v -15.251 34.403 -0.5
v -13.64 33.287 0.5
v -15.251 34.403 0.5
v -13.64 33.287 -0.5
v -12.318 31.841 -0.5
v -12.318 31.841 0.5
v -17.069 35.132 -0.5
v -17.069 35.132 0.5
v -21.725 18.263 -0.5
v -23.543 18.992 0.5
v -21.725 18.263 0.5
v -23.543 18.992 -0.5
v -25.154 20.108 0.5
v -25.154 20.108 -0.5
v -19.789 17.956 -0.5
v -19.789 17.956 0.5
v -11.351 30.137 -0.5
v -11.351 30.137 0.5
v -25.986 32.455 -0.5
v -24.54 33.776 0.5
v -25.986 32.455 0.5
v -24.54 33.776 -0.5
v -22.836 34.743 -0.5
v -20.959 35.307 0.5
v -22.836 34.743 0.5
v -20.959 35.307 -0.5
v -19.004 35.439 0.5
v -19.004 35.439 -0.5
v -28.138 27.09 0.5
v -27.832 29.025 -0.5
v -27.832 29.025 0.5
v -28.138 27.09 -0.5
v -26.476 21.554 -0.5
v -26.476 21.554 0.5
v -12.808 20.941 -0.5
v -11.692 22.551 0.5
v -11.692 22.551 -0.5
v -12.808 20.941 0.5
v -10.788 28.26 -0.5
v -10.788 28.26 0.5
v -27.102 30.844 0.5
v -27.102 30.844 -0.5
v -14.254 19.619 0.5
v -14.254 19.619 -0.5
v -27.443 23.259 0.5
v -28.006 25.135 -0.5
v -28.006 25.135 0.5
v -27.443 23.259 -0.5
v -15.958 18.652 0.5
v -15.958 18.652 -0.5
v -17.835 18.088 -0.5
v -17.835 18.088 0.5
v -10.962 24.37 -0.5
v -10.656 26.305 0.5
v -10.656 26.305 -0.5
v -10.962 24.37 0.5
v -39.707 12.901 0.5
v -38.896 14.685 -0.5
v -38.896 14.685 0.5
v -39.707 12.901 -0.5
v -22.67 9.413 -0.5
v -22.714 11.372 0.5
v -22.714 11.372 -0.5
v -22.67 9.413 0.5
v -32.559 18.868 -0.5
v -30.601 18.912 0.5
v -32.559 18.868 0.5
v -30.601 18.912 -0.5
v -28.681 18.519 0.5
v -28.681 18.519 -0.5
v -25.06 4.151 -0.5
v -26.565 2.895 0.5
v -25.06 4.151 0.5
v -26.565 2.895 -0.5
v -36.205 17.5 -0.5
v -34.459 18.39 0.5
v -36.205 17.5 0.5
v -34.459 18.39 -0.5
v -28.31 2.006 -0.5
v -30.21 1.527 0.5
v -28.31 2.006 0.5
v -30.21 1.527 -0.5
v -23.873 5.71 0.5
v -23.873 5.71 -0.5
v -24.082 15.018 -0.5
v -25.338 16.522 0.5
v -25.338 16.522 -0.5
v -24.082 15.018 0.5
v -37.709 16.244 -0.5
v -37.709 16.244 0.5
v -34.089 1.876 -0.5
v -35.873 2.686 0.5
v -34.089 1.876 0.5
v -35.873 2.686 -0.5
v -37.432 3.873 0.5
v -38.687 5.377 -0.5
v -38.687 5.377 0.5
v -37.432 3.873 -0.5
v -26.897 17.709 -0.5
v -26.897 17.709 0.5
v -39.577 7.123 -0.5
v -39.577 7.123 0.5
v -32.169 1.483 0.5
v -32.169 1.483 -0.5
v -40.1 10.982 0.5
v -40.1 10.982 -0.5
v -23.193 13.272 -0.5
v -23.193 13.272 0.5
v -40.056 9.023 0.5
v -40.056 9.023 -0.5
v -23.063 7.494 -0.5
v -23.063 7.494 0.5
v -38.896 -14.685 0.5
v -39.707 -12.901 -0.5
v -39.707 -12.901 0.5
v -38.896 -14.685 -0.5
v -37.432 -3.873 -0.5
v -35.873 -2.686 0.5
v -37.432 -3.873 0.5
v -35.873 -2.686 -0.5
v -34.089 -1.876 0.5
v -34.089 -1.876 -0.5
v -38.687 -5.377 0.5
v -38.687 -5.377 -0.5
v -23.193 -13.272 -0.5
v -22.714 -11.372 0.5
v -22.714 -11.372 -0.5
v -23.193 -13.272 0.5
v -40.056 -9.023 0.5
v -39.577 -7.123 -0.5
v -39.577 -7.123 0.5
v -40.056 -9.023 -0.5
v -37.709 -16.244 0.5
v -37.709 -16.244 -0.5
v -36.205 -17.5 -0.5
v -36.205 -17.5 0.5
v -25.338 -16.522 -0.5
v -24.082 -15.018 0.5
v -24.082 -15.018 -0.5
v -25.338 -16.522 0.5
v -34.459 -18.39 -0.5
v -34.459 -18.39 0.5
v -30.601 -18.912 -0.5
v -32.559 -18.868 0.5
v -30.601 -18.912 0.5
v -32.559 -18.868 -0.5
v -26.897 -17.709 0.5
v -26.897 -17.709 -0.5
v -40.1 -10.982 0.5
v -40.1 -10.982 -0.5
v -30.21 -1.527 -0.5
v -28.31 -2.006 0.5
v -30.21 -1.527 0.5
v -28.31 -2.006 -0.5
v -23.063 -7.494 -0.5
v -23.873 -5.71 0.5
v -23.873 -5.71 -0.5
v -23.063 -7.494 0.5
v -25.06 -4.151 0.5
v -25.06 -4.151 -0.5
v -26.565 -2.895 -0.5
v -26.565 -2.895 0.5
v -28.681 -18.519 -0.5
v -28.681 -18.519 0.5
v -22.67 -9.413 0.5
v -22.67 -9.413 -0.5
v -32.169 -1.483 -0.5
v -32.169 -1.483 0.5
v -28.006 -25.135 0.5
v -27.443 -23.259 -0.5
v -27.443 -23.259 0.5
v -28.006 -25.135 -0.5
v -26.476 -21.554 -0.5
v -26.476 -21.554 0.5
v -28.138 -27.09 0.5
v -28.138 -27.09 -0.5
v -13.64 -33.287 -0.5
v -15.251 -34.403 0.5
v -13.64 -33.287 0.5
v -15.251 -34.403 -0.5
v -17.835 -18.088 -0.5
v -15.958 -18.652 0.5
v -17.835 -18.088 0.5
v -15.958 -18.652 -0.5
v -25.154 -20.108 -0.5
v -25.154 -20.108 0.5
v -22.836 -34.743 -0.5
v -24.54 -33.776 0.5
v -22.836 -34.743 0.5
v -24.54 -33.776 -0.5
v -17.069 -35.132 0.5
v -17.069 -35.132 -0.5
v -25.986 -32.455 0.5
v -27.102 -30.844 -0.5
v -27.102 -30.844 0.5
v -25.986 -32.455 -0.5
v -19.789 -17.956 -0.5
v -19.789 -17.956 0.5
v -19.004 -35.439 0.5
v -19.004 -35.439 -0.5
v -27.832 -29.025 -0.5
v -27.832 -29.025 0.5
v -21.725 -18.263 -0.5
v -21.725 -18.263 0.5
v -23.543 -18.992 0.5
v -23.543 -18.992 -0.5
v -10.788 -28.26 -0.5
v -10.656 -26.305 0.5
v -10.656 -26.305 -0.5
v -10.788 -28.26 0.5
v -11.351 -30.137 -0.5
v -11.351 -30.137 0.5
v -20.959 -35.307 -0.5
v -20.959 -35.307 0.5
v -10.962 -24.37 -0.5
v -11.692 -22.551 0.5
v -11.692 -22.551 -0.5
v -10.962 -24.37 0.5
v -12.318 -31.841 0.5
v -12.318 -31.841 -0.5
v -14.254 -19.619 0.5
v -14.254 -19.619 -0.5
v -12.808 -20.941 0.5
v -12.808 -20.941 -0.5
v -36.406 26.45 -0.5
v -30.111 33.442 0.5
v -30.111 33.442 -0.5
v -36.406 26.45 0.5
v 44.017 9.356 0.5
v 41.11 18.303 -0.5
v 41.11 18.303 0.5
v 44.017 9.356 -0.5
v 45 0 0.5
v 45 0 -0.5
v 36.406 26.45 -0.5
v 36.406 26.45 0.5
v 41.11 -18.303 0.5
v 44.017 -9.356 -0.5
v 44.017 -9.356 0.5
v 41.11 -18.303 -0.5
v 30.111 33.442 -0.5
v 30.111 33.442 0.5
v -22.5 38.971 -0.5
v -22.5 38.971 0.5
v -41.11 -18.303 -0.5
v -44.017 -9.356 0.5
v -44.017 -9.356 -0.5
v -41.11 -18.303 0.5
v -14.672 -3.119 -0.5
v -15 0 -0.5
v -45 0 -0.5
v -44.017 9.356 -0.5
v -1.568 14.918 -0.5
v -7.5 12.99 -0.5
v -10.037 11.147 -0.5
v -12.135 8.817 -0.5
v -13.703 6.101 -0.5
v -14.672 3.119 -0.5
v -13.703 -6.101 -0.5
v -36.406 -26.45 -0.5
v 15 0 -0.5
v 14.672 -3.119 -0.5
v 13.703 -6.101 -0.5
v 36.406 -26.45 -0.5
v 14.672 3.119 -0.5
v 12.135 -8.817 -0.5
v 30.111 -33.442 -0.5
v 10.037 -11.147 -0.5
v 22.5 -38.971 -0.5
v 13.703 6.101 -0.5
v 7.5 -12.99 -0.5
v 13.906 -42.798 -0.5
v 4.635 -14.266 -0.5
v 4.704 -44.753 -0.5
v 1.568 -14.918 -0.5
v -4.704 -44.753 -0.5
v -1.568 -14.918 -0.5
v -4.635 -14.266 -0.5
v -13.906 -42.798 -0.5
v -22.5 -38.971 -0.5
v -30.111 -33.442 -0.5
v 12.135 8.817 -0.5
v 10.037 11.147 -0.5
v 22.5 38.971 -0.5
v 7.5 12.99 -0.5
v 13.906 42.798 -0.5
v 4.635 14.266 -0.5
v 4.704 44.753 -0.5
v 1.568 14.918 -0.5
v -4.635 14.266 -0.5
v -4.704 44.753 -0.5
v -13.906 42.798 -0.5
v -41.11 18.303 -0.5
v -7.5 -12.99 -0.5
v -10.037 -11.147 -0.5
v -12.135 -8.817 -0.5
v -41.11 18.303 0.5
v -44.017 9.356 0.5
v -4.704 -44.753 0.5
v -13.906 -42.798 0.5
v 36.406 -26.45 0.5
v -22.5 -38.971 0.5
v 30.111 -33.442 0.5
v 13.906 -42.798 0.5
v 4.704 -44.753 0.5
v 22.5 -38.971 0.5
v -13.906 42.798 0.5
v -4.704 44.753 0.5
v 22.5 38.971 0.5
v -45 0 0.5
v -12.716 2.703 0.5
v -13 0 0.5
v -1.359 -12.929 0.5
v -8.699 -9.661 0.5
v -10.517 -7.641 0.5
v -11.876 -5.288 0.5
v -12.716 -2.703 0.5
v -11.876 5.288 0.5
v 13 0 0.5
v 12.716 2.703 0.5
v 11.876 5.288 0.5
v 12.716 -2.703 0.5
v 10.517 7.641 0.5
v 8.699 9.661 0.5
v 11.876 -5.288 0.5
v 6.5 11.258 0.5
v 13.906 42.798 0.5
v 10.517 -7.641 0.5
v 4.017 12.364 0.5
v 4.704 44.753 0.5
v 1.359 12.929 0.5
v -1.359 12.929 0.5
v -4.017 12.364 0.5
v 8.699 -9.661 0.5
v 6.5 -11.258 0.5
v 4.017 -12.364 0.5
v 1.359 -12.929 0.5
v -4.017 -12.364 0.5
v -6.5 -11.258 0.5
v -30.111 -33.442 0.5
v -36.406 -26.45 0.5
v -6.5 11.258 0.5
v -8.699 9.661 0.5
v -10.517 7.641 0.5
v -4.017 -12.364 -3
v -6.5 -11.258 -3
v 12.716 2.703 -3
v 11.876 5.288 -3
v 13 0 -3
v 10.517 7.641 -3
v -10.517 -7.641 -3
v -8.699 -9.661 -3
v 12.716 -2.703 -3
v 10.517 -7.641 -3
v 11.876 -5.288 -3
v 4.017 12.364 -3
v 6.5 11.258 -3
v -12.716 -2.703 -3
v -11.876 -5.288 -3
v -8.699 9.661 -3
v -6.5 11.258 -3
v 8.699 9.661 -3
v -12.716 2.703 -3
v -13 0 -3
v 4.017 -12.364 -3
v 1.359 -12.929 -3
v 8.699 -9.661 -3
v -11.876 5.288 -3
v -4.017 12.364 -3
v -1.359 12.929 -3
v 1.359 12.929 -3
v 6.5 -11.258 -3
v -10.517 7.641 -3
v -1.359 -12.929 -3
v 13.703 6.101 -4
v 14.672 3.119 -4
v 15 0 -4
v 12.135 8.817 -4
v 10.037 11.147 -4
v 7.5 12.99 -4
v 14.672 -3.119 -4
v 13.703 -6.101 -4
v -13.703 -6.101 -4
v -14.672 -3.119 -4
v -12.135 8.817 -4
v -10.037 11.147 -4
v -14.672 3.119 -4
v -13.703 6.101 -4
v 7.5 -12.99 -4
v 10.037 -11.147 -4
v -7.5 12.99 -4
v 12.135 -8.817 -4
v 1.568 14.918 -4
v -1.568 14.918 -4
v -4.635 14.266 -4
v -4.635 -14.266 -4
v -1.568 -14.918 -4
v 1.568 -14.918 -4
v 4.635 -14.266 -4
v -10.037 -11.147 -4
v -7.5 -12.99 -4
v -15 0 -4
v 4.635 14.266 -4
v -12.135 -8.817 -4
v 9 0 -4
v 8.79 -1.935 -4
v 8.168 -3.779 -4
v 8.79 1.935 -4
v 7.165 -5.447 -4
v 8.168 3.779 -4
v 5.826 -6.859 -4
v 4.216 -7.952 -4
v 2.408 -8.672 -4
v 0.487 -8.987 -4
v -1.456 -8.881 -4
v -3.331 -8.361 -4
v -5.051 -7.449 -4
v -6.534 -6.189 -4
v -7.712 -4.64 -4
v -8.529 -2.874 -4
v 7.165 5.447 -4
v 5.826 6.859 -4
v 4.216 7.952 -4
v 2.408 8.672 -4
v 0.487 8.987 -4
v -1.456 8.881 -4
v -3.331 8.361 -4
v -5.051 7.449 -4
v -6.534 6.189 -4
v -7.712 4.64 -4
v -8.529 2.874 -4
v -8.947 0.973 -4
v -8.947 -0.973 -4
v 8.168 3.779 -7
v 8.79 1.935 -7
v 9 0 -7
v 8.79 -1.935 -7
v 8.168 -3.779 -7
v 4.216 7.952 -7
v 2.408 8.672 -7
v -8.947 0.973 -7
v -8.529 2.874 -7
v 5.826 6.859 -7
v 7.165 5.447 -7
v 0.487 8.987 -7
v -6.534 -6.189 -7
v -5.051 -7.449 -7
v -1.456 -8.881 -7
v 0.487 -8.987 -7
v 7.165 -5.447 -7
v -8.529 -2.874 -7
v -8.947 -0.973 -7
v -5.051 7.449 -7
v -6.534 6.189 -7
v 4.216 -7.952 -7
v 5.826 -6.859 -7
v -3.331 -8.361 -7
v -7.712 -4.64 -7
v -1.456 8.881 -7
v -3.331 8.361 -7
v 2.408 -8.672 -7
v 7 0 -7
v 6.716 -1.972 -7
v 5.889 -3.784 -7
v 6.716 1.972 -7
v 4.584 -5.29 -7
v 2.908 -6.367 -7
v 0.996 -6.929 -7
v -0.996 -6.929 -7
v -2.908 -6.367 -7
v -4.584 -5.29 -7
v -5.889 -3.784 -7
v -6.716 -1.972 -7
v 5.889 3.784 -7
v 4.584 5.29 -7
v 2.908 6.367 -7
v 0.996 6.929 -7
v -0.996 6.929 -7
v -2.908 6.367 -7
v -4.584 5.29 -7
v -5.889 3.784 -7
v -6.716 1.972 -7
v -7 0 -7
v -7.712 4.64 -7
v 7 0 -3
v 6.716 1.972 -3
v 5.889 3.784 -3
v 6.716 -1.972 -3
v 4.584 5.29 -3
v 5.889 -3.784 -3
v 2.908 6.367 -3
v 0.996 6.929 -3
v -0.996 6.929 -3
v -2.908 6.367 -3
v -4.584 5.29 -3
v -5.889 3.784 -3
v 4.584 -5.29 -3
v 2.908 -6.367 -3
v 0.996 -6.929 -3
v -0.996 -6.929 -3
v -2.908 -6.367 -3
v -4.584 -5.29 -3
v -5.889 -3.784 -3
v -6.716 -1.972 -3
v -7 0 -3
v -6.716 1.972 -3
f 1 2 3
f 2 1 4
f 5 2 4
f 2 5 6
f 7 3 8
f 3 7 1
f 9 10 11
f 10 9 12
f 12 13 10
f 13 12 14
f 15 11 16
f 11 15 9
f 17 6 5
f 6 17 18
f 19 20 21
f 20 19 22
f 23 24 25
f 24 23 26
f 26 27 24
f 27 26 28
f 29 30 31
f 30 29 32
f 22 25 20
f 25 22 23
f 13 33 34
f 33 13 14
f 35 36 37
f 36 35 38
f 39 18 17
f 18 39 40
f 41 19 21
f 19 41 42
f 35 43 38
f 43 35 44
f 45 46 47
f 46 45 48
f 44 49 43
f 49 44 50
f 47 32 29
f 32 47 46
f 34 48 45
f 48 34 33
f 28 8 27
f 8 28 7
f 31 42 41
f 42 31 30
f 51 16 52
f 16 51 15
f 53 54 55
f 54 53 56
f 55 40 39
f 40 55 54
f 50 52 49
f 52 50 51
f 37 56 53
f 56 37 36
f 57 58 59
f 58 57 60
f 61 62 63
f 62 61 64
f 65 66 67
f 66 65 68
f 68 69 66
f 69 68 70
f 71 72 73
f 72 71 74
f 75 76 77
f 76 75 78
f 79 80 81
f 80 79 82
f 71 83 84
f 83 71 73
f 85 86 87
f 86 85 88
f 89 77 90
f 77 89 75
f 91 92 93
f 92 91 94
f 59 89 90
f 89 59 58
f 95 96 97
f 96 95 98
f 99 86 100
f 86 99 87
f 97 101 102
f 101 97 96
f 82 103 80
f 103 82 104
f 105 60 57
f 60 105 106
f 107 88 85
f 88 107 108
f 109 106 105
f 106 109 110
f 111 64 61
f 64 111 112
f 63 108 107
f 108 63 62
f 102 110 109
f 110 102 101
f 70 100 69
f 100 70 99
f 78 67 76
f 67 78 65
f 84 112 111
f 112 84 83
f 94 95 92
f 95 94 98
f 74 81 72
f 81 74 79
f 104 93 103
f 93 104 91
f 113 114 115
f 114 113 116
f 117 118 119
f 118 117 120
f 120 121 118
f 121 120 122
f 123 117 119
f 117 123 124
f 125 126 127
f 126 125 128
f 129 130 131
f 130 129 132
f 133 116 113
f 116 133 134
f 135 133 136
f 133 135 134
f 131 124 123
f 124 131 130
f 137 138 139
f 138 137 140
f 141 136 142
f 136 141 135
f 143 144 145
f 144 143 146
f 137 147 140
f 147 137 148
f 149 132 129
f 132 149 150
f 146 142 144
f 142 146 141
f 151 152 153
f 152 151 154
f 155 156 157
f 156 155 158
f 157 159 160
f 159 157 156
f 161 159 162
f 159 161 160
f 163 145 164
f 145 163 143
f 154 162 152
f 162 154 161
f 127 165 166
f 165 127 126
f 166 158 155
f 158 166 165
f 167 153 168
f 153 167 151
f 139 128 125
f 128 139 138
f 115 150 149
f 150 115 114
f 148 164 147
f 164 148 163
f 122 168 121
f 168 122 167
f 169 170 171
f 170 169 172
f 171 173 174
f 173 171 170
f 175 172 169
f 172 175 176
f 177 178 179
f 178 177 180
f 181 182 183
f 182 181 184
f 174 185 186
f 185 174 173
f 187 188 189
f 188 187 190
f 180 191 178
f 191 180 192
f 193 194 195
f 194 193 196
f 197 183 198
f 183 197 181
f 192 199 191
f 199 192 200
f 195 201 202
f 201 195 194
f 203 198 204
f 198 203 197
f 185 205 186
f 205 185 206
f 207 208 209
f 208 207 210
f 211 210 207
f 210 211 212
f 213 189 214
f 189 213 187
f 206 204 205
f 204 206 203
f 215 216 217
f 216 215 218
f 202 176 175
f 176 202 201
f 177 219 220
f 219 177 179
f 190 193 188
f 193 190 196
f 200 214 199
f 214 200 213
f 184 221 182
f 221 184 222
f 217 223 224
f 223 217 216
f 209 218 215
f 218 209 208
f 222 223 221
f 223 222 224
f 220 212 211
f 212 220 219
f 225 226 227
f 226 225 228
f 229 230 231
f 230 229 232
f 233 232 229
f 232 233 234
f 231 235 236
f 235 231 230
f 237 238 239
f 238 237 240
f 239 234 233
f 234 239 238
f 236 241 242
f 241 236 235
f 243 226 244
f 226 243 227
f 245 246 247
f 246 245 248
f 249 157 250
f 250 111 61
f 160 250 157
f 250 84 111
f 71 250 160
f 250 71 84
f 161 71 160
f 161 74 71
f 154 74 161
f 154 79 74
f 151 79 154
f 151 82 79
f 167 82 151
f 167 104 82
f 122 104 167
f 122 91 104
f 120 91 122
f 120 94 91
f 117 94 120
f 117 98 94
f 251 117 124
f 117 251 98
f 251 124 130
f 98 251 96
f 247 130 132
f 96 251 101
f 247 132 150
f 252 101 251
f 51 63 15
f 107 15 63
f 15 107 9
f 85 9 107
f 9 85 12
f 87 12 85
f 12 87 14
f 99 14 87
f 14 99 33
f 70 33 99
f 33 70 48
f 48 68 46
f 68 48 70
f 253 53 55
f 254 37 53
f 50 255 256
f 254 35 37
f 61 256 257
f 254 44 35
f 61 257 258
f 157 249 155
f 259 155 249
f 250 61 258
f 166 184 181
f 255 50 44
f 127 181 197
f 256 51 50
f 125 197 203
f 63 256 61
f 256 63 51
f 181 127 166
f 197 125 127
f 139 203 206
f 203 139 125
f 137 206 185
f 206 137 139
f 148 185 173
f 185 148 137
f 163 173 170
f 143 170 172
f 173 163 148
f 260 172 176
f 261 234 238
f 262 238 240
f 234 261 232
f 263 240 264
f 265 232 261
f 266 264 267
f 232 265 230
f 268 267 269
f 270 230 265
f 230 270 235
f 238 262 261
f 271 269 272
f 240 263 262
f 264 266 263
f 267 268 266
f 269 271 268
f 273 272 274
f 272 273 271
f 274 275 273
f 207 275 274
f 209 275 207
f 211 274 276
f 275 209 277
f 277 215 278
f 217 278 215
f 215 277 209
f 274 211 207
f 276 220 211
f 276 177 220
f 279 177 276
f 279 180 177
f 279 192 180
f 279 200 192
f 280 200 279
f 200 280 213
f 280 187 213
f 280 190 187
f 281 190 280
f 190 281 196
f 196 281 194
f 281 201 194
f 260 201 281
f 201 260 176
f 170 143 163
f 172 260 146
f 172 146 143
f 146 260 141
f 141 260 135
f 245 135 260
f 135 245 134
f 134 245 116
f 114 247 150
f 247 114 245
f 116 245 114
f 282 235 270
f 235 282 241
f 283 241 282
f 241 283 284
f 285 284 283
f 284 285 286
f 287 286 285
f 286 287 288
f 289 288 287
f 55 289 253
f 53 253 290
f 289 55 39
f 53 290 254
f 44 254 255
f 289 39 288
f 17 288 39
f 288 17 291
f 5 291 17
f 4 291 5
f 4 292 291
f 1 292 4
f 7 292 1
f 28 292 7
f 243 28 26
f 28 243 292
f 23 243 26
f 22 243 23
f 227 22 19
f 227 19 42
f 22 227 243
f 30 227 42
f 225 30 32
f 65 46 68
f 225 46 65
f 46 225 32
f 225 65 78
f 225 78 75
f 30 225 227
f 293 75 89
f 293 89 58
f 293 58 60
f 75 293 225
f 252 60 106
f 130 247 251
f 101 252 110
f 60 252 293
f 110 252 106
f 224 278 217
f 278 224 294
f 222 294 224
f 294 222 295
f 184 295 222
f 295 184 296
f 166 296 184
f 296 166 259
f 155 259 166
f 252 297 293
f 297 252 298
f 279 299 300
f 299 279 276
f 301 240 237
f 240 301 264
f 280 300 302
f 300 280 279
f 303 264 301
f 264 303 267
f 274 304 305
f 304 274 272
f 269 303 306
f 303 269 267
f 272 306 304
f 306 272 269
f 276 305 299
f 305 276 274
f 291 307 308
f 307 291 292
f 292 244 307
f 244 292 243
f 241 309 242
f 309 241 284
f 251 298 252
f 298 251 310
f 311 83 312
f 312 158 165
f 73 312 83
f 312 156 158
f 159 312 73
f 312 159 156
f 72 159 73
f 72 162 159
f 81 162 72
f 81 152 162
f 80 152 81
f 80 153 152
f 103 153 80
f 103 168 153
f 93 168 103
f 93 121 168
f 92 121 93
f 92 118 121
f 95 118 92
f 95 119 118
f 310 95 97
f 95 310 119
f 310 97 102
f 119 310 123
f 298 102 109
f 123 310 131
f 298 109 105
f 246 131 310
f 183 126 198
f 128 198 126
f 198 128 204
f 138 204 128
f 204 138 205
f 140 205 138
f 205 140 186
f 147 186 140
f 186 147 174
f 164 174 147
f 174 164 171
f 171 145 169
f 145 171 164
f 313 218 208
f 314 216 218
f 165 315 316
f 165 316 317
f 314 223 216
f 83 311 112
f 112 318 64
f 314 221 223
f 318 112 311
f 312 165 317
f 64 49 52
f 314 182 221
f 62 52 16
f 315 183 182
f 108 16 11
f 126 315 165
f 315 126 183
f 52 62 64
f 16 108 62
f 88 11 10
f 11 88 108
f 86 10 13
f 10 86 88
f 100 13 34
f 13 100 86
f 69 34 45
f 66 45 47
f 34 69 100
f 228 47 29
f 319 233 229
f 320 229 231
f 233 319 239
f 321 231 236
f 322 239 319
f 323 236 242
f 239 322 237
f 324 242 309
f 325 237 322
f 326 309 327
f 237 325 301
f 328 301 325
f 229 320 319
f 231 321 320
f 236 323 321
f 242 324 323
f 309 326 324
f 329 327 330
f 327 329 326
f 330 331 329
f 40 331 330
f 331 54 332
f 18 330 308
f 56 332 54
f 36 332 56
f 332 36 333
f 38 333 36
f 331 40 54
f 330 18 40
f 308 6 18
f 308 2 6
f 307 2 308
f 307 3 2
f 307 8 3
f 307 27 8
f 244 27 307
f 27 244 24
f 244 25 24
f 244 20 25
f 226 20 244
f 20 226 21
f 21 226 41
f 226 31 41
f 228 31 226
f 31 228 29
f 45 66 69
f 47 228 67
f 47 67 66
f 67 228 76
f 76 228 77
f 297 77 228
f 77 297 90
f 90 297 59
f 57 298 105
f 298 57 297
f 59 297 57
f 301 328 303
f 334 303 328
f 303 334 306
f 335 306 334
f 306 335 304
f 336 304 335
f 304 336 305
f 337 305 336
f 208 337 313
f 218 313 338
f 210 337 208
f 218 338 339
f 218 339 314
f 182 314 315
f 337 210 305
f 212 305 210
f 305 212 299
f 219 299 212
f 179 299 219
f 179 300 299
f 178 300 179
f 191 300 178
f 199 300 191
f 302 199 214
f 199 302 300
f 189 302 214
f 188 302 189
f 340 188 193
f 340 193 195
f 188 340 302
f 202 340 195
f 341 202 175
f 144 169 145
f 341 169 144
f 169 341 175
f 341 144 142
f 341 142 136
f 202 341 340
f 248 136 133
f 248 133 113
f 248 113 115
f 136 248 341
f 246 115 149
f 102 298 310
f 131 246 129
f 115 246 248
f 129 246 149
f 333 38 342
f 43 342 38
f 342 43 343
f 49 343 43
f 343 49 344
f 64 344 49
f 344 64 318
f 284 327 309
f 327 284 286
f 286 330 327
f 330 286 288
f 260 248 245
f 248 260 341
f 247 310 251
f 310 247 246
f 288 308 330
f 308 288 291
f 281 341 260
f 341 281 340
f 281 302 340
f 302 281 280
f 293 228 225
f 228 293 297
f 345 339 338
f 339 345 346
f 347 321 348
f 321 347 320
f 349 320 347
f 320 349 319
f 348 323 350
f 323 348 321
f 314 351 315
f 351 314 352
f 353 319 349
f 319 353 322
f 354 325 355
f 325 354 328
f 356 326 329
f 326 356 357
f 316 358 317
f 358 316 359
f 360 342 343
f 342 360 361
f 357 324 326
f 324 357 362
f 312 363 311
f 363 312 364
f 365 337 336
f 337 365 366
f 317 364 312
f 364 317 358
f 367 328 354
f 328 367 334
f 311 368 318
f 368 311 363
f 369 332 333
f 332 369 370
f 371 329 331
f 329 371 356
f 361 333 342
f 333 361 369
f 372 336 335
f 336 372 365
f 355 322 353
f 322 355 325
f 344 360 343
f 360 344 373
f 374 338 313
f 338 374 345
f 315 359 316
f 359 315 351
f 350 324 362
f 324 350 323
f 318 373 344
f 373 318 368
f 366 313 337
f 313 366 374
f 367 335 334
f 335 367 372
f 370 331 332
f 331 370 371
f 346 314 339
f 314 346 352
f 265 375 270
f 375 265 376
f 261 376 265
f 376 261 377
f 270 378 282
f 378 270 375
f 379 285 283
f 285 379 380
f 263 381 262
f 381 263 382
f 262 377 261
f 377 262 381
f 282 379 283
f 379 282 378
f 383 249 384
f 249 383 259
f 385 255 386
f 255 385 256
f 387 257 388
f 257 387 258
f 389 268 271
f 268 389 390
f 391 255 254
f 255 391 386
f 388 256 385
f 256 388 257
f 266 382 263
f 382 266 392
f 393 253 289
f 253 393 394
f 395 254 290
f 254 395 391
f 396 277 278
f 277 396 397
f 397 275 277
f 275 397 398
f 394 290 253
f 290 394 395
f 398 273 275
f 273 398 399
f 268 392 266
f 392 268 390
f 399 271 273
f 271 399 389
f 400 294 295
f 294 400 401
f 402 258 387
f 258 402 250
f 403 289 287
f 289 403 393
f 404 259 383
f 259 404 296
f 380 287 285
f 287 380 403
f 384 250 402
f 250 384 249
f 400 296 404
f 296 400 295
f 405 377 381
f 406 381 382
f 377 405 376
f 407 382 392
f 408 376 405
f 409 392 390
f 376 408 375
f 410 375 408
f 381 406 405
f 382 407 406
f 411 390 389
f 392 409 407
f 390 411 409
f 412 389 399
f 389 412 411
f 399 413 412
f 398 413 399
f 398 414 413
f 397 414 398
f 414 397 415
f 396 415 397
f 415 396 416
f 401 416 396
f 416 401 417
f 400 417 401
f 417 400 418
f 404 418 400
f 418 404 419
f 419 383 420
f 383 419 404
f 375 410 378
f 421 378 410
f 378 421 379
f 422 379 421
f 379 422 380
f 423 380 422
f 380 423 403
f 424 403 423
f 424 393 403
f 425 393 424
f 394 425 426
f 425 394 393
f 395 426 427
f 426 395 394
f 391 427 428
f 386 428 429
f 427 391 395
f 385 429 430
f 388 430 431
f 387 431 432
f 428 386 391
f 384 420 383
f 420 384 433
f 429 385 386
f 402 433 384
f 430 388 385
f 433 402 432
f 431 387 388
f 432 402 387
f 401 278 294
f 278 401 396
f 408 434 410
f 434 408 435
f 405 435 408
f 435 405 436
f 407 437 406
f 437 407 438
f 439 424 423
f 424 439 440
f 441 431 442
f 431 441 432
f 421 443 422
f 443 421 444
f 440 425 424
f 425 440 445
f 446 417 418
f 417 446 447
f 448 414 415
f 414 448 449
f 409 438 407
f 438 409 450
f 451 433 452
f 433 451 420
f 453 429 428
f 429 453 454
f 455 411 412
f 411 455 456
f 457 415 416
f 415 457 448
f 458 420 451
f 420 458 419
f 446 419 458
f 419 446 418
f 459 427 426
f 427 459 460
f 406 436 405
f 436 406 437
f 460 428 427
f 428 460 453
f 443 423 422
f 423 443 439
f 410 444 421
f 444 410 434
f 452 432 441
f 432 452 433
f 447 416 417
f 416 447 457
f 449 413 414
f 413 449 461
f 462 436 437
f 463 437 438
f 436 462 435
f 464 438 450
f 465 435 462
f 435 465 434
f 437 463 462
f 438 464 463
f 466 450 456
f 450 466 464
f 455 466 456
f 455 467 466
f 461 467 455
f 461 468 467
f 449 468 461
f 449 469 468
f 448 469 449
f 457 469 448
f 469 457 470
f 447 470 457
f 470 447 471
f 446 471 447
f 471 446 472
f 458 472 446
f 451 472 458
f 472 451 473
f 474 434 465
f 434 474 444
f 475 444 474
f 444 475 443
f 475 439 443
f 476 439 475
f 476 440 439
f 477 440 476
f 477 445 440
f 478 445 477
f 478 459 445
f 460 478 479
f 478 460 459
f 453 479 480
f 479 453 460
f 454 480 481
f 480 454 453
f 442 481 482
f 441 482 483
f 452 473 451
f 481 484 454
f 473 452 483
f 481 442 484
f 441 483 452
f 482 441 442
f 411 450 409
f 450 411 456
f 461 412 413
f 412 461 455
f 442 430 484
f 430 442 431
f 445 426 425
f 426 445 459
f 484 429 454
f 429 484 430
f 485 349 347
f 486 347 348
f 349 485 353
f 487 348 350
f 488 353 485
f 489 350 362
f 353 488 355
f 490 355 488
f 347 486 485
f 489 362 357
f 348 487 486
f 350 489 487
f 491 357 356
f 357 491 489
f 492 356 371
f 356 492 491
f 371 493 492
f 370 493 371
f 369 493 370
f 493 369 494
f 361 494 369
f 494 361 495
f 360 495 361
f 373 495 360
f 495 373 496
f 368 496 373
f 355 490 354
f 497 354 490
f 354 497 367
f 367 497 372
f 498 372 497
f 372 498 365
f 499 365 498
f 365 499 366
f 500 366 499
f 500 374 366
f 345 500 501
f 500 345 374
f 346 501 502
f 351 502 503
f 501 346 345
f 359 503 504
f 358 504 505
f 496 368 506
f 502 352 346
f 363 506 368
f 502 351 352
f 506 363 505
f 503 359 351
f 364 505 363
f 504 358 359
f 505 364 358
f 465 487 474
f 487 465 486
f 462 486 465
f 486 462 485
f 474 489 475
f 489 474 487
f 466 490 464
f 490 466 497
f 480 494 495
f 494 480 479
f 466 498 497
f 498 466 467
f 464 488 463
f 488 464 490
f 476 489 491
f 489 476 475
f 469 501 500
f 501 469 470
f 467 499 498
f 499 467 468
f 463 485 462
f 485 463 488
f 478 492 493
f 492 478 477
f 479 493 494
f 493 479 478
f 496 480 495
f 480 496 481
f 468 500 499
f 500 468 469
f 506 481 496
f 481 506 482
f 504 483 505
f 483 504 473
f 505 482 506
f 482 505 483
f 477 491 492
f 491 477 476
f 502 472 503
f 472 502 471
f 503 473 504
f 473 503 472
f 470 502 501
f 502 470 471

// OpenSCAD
// file: tapped.scad
include <constants.scad>;

//--------------------------------------------------------------
//-- Generic module for the horn's drills
//-- Parameters:
//--  d = drill's radial distance (from the horn's center)
//--  n = number of drills
//--  h = wheel height
//--------------------------------------------------------------
module horn_drills(d,n,h)
{
  union() {
    for ( i = [0 : n-1] ) {
        rotate([0,0,i*360/n])
        translate([0,d,0])
        cylinder(r=horn_drill_diam/2, h=h+10,center=true, $fn=6);  
      }
  }
}

//-----------------------------------------
//-- Futaba 3003 horn4 arm
//-- This module is just one arm
//-----------------------------------------
module horn4_arm(h=5)
{
  translate([0,a4h_arm_length-a4h_end_diam/2,0])
  //-- The arm consist of the perimeter of a cylinder and a cube
  hull() {
    cylinder(r=a4h_end_diam/2, h=h, center=true, $fn=20);
    translate([0,1-a4h_arm_length+a4h_end_diam/2,0])
      cube([a4h_center_diam,2,h],center=true);
  }
}

//-------------------------------------------
//-- Futaba 3003 4-arm horn
//-------------------------------------------
module horn4(h=5)
{
  union() {
    //-- Center part (is a square)
    cube([a4h_center_diam+0.2,a4h_center_diam+0.2,h],center=true);

    //-- Place the 4 arms in every side of the cube
    for ( i = [0 : 1] ) {
      rotate( [0,0,i*180])
      translate([0, a4h_center_diam/2, 0])
      horn4_arm(h);
    }
  }

}

//-------------------------------------------------------
//--  A Wheel for the futaba 3003 4-arm horns
//--------------------------------------------------------
module Servo_wheel_4_arm_horn()
{
  difference() {
      raw_wheel(or_idiam=wheel_or_idiam, or_diam=wheel_or_diam, h=wheel_height);

      //-- Inner drill
      cylinder(center=true, h=2*wheel_height + 10, r=a4h_center_diam/2,$fn=20);

      //-- substract the 4-arm servo horn
      translate([0,0,horn_height-horn_plate_height])
        horn4(h=wheel_height);

      //-- Horn drills
      horn_drills(d=a4h_drill_distance, n=4, h=wheel_height);

  }
}

difference() {
//	minkowski() {
		union() {
			// Bottom plate
			translate([-a4h_center_diam, -a4h_center_diam - a4h_arm_length, -wheel_height])
				cube([pill_holder, length, wheel_height]);

			// Hole plate
			translate([-a4h_center_diam, length - a4h_center_diam - a4h_arm_length - pill_holder + 5, -wheel_height])
				cube([pill_holder, pill_holder, pill_height]);

			// Filler plate
			translate([-a4h_center_diam + pill_holder - 4, length - a4h_center_diam - a4h_arm_length - pill_holder + 3, -wheel_height])				
				rotate([0, 0, -10])
					cube([pill_holder, pill_holder, pill_height]);				
		}
//		sphere(r=2, $fn=40);
//	}			

	// Horn hole
	horn4(h=wheel_height);
	horn_drills(d=a4h_drill_distance, n=2, h=wheel_height);
	translate([0, 0, -wheel_height * 2])
		cylinder(h=wheel_height * 2, r=3);

	// Pill hole
	translate([2, 38, -pill_height])
		cylinder(h=pill_height * 2, r=pill_diam / 2);
}
	
// file: constants.scad
//-------------------------------------------------------------
//-- Futaba Horn from Servo wheel by Juan Gonzalez (obijuan) juan@iearobotics.com
//-------------------------------------------------------------

//-- Wheel parameters
wheel_or_idiam = 50;                   //-- O-ring inner diameter
wheel_or_diam = 1;                     //-- O-ring section diameter
wheel_height = 2*wheel_or_diam+0;     //-- Wheel height: change the 0 for 
                                      //-- other value (0 equals minimun height)
//-- Parameters common to all horns
horn_drill_diam = 2;
horn_height = 8;        //-- Total height: shaft + plate
horn_plate_height = 2;  //-- plate height

//-- Futaba 3003 servo rounded horn parameters
rh_diam1 = 8.5;  //-- Rounded horn small diameter
rh_diam2 = 24; //-- Rounded horn big diameter
rounded_horn_drill_distance = 7.3;

//-- Futaba 3003 4-arm horn parameters
a4h_end_diam = 5;
a4h_center_diam = 10;
a4h_arm_length = 15;
a4h_drill_distance = 13.3;

//-- Pill parameters
pill_diam = 16;
pill_height = 8;
pill_holder = pill_diam * 1.5;

length = 70;
// main file
include <constants.scad>;
use <tapped.scad>;

module wheel1() {
	difference() {
		cylinder(r=45, h=1, center=true);
		for (i = [1 : 4]) {
			translate([0, 0, 0])
			rotate([0,0,i*36])
				translate([0, 33, -1])
					cylinder(h=3, r=(pill_diam + 1.5) / 2);
		}		

		translate([0, 0, -1])
			cylinder(r=13, h=2);
	}
	
	difference() {
		union() {
			translate([0, 0, -4])
				cylinder(r=15, h=4);
	
			translate([0, 0, -7])
				cylinder(r=9, h=3);
		}

		translate([0, 0, -3])
			cylinder(r=13, h=4);		

		translate([0, 0, -7])
				cylinder(r=7, h=4);
	}	
}

module wheel2() {
	difference() {
		cylinder(r=45, h=1, center=true);
		for (i = [0 : 0]) {
			translate([0, 0, 0])
			rotate([0,0,i*36])
				translate([0, 33, -1])
					cylinder(h=3, r=pill_diam / 2);
		}

		//-- Inner drill
		translate([0, 0, -pill_height / 2])
			cylinder(h=pill_height, r=rh_diam1/2+0.2,$fn=100);

		//-- Carved circle for the Futaba rounded horn
		translate([0, 0, pill_height / 2 - 2]) 
			cylinder(r=rh_diam2/2+0.25, h=2.1, $fn=30);

		//-- small drills for the rounded horn
		horn_drills(d=rounded_horn_drill_distance, n=4, h=pill_height);
	}
}

module wheel3() {
	difference() {
		cylinder(r=45, h=pill_height, center=true);
		for (i = [0 : 0]) {
			translate([0, 0, 0])
			rotate([0,0,i*36])
				translate([0, 33, -pill_height / 2])
					cylinder(h=pill_height + 2, r=pill_diam / 2);
		}

		translate([60, 0, -1])
			cube([90, 90, pill_height + 2], center=true);

		//-- Inner drill
		translate([0, 0, -pill_height / 2])
			cylinder(h=pill_height, r=rh_diam1/2+0.2,$fn=100);

		//-- Carved circle for the Futaba rounded horn
		translate([0, 0, pill_height / 2 - 2]) 
			cylinder(r=rh_diam2/2+0.25, h=2.1, $fn=30);

		//-- small drills for the rounded horn
		horn_drills(d=rounded_horn_drill_distance, n=4, h=pill_height);
	}
}

module wheel4() {
	difference() {
		cylinder(r=45, h=1, center=true);
		for (i = [0 : 0]) {
			translate([0, 0, 0])
			rotate([0,0,i*36])
				translate([0, 33, -1])
					cylinder(h=3, r=pill_diam / 2);
		}
		translate([0, 0, -1])
			cylinder(r=7, h=3);
		translate([60, 0, -1])
			cube([90, 90, 3], center=true);
	}
}

wheel1();
//wheel2();
//wheel3();
//wheel4();
